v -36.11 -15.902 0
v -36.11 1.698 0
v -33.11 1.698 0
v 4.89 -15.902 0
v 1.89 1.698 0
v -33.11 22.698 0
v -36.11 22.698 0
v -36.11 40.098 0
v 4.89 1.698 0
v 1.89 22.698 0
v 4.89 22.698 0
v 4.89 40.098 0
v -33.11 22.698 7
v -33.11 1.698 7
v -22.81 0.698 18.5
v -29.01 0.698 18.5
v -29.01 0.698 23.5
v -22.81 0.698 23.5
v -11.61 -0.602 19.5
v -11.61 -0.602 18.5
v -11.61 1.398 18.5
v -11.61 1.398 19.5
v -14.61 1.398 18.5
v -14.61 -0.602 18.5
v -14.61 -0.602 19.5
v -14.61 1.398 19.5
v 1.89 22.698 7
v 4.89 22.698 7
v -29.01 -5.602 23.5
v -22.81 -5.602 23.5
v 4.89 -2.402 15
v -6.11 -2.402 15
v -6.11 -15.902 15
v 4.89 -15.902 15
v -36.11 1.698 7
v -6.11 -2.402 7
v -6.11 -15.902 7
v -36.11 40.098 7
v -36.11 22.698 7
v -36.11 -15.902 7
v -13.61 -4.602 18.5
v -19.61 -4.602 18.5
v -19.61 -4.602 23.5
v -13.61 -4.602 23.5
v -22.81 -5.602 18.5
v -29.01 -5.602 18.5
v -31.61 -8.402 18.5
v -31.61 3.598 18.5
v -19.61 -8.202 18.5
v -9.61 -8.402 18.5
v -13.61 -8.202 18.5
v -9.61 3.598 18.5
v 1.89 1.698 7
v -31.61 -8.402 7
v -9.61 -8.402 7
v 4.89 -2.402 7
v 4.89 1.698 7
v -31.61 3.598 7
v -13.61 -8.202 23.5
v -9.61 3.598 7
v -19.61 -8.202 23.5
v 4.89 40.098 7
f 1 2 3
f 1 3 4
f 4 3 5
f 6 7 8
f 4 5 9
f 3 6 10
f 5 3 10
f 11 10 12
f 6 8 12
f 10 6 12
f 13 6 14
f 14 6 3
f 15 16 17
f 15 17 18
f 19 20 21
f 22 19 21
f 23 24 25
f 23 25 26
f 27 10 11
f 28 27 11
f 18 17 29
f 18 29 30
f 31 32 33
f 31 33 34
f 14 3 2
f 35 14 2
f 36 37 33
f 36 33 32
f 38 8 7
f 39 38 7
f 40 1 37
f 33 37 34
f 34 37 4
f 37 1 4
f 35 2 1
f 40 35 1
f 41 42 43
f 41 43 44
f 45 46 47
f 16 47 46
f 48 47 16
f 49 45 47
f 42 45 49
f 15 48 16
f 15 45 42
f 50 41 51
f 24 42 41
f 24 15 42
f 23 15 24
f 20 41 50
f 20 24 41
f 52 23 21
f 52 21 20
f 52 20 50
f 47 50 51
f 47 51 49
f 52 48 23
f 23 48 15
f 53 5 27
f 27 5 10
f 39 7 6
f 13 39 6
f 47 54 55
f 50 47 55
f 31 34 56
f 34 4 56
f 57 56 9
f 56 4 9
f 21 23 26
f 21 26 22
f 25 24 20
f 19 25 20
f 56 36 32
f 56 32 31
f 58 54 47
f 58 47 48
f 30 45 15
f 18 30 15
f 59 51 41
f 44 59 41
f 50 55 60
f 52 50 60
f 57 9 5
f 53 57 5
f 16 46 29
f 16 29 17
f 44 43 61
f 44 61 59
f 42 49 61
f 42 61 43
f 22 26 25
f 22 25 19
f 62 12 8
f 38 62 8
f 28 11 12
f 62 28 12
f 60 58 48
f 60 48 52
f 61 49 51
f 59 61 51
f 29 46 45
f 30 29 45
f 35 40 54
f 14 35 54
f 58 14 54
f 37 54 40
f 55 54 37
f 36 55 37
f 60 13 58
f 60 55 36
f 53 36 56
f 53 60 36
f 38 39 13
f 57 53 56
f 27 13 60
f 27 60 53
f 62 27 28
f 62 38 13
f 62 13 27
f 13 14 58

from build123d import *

# Parameters (mm, degrees)
F1_DEPTH = 7
F2_W     = 11
F2_H     = 13.5
F3_DEPTH = 8
F4_W     = 22
F4_H     = 12
F5_DEPTH = 11.5
F6_W     = 3
F6_H     = 2
F7_DEPTH = 1
F6_W_2   = 6.2
F6_H_2   = 6.3
F6_W_3   = 6
F6_H_3   = 3.6
F8_DEPTH = 5


with BuildPart() as f1:
    # F0 (on Top) → F1 (new body)
    with BuildSketch(Plane.XY):
        Polygon((4.890249, 40.097855), (-36.109751, 40.097855), (-36.109751, 22.697855), (-33.109751, 22.697855), (-33.109751, 1.697855), (-36.109751, 1.697855), (-36.109751, -15.902145), (4.890249, -15.902145), (4.890249, 1.697855), (1.890249, 1.697855), (1.890249, 22.697855), (4.890249, 22.697855), align=None)
    extrude(amount=F1_DEPTH)

    # F2 (on face) → F3 (join)
    with BuildSketch(Plane.XY.offset(7)):
        with Locations((-0.609751, -9.152145)):
            Rectangle(F2_W, F2_H)
    extrude(amount=F3_DEPTH)

    # F4 (on face) → F5 (join)
    with BuildSketch(Plane.XY.offset(7)):
        with Locations((-20.609751, -2.402145)):
            Rectangle(F4_W, F4_H)
    extrude(amount=F5_DEPTH)

    # F6 (on face) → F7 (join)
    with BuildSketch(Plane.XY.offset(18.5)):
        with Locations((-13.109751, 0.397855)):
            Rectangle(F6_W, F6_H)
    extrude(amount=F7_DEPTH)

    # F6 (on face) → F8 (join)
    with BuildSketch(Plane.XY.offset(18.5)):
        with Locations((-25.909751, -2.452145)):
            Rectangle(F6_W_2, F6_H_2)
        with Locations((-16.609751, -6.402145)):
            Rectangle(F6_W_3, F6_H_3)
    extrude(amount=F8_DEPTH)


solid = f1.part
